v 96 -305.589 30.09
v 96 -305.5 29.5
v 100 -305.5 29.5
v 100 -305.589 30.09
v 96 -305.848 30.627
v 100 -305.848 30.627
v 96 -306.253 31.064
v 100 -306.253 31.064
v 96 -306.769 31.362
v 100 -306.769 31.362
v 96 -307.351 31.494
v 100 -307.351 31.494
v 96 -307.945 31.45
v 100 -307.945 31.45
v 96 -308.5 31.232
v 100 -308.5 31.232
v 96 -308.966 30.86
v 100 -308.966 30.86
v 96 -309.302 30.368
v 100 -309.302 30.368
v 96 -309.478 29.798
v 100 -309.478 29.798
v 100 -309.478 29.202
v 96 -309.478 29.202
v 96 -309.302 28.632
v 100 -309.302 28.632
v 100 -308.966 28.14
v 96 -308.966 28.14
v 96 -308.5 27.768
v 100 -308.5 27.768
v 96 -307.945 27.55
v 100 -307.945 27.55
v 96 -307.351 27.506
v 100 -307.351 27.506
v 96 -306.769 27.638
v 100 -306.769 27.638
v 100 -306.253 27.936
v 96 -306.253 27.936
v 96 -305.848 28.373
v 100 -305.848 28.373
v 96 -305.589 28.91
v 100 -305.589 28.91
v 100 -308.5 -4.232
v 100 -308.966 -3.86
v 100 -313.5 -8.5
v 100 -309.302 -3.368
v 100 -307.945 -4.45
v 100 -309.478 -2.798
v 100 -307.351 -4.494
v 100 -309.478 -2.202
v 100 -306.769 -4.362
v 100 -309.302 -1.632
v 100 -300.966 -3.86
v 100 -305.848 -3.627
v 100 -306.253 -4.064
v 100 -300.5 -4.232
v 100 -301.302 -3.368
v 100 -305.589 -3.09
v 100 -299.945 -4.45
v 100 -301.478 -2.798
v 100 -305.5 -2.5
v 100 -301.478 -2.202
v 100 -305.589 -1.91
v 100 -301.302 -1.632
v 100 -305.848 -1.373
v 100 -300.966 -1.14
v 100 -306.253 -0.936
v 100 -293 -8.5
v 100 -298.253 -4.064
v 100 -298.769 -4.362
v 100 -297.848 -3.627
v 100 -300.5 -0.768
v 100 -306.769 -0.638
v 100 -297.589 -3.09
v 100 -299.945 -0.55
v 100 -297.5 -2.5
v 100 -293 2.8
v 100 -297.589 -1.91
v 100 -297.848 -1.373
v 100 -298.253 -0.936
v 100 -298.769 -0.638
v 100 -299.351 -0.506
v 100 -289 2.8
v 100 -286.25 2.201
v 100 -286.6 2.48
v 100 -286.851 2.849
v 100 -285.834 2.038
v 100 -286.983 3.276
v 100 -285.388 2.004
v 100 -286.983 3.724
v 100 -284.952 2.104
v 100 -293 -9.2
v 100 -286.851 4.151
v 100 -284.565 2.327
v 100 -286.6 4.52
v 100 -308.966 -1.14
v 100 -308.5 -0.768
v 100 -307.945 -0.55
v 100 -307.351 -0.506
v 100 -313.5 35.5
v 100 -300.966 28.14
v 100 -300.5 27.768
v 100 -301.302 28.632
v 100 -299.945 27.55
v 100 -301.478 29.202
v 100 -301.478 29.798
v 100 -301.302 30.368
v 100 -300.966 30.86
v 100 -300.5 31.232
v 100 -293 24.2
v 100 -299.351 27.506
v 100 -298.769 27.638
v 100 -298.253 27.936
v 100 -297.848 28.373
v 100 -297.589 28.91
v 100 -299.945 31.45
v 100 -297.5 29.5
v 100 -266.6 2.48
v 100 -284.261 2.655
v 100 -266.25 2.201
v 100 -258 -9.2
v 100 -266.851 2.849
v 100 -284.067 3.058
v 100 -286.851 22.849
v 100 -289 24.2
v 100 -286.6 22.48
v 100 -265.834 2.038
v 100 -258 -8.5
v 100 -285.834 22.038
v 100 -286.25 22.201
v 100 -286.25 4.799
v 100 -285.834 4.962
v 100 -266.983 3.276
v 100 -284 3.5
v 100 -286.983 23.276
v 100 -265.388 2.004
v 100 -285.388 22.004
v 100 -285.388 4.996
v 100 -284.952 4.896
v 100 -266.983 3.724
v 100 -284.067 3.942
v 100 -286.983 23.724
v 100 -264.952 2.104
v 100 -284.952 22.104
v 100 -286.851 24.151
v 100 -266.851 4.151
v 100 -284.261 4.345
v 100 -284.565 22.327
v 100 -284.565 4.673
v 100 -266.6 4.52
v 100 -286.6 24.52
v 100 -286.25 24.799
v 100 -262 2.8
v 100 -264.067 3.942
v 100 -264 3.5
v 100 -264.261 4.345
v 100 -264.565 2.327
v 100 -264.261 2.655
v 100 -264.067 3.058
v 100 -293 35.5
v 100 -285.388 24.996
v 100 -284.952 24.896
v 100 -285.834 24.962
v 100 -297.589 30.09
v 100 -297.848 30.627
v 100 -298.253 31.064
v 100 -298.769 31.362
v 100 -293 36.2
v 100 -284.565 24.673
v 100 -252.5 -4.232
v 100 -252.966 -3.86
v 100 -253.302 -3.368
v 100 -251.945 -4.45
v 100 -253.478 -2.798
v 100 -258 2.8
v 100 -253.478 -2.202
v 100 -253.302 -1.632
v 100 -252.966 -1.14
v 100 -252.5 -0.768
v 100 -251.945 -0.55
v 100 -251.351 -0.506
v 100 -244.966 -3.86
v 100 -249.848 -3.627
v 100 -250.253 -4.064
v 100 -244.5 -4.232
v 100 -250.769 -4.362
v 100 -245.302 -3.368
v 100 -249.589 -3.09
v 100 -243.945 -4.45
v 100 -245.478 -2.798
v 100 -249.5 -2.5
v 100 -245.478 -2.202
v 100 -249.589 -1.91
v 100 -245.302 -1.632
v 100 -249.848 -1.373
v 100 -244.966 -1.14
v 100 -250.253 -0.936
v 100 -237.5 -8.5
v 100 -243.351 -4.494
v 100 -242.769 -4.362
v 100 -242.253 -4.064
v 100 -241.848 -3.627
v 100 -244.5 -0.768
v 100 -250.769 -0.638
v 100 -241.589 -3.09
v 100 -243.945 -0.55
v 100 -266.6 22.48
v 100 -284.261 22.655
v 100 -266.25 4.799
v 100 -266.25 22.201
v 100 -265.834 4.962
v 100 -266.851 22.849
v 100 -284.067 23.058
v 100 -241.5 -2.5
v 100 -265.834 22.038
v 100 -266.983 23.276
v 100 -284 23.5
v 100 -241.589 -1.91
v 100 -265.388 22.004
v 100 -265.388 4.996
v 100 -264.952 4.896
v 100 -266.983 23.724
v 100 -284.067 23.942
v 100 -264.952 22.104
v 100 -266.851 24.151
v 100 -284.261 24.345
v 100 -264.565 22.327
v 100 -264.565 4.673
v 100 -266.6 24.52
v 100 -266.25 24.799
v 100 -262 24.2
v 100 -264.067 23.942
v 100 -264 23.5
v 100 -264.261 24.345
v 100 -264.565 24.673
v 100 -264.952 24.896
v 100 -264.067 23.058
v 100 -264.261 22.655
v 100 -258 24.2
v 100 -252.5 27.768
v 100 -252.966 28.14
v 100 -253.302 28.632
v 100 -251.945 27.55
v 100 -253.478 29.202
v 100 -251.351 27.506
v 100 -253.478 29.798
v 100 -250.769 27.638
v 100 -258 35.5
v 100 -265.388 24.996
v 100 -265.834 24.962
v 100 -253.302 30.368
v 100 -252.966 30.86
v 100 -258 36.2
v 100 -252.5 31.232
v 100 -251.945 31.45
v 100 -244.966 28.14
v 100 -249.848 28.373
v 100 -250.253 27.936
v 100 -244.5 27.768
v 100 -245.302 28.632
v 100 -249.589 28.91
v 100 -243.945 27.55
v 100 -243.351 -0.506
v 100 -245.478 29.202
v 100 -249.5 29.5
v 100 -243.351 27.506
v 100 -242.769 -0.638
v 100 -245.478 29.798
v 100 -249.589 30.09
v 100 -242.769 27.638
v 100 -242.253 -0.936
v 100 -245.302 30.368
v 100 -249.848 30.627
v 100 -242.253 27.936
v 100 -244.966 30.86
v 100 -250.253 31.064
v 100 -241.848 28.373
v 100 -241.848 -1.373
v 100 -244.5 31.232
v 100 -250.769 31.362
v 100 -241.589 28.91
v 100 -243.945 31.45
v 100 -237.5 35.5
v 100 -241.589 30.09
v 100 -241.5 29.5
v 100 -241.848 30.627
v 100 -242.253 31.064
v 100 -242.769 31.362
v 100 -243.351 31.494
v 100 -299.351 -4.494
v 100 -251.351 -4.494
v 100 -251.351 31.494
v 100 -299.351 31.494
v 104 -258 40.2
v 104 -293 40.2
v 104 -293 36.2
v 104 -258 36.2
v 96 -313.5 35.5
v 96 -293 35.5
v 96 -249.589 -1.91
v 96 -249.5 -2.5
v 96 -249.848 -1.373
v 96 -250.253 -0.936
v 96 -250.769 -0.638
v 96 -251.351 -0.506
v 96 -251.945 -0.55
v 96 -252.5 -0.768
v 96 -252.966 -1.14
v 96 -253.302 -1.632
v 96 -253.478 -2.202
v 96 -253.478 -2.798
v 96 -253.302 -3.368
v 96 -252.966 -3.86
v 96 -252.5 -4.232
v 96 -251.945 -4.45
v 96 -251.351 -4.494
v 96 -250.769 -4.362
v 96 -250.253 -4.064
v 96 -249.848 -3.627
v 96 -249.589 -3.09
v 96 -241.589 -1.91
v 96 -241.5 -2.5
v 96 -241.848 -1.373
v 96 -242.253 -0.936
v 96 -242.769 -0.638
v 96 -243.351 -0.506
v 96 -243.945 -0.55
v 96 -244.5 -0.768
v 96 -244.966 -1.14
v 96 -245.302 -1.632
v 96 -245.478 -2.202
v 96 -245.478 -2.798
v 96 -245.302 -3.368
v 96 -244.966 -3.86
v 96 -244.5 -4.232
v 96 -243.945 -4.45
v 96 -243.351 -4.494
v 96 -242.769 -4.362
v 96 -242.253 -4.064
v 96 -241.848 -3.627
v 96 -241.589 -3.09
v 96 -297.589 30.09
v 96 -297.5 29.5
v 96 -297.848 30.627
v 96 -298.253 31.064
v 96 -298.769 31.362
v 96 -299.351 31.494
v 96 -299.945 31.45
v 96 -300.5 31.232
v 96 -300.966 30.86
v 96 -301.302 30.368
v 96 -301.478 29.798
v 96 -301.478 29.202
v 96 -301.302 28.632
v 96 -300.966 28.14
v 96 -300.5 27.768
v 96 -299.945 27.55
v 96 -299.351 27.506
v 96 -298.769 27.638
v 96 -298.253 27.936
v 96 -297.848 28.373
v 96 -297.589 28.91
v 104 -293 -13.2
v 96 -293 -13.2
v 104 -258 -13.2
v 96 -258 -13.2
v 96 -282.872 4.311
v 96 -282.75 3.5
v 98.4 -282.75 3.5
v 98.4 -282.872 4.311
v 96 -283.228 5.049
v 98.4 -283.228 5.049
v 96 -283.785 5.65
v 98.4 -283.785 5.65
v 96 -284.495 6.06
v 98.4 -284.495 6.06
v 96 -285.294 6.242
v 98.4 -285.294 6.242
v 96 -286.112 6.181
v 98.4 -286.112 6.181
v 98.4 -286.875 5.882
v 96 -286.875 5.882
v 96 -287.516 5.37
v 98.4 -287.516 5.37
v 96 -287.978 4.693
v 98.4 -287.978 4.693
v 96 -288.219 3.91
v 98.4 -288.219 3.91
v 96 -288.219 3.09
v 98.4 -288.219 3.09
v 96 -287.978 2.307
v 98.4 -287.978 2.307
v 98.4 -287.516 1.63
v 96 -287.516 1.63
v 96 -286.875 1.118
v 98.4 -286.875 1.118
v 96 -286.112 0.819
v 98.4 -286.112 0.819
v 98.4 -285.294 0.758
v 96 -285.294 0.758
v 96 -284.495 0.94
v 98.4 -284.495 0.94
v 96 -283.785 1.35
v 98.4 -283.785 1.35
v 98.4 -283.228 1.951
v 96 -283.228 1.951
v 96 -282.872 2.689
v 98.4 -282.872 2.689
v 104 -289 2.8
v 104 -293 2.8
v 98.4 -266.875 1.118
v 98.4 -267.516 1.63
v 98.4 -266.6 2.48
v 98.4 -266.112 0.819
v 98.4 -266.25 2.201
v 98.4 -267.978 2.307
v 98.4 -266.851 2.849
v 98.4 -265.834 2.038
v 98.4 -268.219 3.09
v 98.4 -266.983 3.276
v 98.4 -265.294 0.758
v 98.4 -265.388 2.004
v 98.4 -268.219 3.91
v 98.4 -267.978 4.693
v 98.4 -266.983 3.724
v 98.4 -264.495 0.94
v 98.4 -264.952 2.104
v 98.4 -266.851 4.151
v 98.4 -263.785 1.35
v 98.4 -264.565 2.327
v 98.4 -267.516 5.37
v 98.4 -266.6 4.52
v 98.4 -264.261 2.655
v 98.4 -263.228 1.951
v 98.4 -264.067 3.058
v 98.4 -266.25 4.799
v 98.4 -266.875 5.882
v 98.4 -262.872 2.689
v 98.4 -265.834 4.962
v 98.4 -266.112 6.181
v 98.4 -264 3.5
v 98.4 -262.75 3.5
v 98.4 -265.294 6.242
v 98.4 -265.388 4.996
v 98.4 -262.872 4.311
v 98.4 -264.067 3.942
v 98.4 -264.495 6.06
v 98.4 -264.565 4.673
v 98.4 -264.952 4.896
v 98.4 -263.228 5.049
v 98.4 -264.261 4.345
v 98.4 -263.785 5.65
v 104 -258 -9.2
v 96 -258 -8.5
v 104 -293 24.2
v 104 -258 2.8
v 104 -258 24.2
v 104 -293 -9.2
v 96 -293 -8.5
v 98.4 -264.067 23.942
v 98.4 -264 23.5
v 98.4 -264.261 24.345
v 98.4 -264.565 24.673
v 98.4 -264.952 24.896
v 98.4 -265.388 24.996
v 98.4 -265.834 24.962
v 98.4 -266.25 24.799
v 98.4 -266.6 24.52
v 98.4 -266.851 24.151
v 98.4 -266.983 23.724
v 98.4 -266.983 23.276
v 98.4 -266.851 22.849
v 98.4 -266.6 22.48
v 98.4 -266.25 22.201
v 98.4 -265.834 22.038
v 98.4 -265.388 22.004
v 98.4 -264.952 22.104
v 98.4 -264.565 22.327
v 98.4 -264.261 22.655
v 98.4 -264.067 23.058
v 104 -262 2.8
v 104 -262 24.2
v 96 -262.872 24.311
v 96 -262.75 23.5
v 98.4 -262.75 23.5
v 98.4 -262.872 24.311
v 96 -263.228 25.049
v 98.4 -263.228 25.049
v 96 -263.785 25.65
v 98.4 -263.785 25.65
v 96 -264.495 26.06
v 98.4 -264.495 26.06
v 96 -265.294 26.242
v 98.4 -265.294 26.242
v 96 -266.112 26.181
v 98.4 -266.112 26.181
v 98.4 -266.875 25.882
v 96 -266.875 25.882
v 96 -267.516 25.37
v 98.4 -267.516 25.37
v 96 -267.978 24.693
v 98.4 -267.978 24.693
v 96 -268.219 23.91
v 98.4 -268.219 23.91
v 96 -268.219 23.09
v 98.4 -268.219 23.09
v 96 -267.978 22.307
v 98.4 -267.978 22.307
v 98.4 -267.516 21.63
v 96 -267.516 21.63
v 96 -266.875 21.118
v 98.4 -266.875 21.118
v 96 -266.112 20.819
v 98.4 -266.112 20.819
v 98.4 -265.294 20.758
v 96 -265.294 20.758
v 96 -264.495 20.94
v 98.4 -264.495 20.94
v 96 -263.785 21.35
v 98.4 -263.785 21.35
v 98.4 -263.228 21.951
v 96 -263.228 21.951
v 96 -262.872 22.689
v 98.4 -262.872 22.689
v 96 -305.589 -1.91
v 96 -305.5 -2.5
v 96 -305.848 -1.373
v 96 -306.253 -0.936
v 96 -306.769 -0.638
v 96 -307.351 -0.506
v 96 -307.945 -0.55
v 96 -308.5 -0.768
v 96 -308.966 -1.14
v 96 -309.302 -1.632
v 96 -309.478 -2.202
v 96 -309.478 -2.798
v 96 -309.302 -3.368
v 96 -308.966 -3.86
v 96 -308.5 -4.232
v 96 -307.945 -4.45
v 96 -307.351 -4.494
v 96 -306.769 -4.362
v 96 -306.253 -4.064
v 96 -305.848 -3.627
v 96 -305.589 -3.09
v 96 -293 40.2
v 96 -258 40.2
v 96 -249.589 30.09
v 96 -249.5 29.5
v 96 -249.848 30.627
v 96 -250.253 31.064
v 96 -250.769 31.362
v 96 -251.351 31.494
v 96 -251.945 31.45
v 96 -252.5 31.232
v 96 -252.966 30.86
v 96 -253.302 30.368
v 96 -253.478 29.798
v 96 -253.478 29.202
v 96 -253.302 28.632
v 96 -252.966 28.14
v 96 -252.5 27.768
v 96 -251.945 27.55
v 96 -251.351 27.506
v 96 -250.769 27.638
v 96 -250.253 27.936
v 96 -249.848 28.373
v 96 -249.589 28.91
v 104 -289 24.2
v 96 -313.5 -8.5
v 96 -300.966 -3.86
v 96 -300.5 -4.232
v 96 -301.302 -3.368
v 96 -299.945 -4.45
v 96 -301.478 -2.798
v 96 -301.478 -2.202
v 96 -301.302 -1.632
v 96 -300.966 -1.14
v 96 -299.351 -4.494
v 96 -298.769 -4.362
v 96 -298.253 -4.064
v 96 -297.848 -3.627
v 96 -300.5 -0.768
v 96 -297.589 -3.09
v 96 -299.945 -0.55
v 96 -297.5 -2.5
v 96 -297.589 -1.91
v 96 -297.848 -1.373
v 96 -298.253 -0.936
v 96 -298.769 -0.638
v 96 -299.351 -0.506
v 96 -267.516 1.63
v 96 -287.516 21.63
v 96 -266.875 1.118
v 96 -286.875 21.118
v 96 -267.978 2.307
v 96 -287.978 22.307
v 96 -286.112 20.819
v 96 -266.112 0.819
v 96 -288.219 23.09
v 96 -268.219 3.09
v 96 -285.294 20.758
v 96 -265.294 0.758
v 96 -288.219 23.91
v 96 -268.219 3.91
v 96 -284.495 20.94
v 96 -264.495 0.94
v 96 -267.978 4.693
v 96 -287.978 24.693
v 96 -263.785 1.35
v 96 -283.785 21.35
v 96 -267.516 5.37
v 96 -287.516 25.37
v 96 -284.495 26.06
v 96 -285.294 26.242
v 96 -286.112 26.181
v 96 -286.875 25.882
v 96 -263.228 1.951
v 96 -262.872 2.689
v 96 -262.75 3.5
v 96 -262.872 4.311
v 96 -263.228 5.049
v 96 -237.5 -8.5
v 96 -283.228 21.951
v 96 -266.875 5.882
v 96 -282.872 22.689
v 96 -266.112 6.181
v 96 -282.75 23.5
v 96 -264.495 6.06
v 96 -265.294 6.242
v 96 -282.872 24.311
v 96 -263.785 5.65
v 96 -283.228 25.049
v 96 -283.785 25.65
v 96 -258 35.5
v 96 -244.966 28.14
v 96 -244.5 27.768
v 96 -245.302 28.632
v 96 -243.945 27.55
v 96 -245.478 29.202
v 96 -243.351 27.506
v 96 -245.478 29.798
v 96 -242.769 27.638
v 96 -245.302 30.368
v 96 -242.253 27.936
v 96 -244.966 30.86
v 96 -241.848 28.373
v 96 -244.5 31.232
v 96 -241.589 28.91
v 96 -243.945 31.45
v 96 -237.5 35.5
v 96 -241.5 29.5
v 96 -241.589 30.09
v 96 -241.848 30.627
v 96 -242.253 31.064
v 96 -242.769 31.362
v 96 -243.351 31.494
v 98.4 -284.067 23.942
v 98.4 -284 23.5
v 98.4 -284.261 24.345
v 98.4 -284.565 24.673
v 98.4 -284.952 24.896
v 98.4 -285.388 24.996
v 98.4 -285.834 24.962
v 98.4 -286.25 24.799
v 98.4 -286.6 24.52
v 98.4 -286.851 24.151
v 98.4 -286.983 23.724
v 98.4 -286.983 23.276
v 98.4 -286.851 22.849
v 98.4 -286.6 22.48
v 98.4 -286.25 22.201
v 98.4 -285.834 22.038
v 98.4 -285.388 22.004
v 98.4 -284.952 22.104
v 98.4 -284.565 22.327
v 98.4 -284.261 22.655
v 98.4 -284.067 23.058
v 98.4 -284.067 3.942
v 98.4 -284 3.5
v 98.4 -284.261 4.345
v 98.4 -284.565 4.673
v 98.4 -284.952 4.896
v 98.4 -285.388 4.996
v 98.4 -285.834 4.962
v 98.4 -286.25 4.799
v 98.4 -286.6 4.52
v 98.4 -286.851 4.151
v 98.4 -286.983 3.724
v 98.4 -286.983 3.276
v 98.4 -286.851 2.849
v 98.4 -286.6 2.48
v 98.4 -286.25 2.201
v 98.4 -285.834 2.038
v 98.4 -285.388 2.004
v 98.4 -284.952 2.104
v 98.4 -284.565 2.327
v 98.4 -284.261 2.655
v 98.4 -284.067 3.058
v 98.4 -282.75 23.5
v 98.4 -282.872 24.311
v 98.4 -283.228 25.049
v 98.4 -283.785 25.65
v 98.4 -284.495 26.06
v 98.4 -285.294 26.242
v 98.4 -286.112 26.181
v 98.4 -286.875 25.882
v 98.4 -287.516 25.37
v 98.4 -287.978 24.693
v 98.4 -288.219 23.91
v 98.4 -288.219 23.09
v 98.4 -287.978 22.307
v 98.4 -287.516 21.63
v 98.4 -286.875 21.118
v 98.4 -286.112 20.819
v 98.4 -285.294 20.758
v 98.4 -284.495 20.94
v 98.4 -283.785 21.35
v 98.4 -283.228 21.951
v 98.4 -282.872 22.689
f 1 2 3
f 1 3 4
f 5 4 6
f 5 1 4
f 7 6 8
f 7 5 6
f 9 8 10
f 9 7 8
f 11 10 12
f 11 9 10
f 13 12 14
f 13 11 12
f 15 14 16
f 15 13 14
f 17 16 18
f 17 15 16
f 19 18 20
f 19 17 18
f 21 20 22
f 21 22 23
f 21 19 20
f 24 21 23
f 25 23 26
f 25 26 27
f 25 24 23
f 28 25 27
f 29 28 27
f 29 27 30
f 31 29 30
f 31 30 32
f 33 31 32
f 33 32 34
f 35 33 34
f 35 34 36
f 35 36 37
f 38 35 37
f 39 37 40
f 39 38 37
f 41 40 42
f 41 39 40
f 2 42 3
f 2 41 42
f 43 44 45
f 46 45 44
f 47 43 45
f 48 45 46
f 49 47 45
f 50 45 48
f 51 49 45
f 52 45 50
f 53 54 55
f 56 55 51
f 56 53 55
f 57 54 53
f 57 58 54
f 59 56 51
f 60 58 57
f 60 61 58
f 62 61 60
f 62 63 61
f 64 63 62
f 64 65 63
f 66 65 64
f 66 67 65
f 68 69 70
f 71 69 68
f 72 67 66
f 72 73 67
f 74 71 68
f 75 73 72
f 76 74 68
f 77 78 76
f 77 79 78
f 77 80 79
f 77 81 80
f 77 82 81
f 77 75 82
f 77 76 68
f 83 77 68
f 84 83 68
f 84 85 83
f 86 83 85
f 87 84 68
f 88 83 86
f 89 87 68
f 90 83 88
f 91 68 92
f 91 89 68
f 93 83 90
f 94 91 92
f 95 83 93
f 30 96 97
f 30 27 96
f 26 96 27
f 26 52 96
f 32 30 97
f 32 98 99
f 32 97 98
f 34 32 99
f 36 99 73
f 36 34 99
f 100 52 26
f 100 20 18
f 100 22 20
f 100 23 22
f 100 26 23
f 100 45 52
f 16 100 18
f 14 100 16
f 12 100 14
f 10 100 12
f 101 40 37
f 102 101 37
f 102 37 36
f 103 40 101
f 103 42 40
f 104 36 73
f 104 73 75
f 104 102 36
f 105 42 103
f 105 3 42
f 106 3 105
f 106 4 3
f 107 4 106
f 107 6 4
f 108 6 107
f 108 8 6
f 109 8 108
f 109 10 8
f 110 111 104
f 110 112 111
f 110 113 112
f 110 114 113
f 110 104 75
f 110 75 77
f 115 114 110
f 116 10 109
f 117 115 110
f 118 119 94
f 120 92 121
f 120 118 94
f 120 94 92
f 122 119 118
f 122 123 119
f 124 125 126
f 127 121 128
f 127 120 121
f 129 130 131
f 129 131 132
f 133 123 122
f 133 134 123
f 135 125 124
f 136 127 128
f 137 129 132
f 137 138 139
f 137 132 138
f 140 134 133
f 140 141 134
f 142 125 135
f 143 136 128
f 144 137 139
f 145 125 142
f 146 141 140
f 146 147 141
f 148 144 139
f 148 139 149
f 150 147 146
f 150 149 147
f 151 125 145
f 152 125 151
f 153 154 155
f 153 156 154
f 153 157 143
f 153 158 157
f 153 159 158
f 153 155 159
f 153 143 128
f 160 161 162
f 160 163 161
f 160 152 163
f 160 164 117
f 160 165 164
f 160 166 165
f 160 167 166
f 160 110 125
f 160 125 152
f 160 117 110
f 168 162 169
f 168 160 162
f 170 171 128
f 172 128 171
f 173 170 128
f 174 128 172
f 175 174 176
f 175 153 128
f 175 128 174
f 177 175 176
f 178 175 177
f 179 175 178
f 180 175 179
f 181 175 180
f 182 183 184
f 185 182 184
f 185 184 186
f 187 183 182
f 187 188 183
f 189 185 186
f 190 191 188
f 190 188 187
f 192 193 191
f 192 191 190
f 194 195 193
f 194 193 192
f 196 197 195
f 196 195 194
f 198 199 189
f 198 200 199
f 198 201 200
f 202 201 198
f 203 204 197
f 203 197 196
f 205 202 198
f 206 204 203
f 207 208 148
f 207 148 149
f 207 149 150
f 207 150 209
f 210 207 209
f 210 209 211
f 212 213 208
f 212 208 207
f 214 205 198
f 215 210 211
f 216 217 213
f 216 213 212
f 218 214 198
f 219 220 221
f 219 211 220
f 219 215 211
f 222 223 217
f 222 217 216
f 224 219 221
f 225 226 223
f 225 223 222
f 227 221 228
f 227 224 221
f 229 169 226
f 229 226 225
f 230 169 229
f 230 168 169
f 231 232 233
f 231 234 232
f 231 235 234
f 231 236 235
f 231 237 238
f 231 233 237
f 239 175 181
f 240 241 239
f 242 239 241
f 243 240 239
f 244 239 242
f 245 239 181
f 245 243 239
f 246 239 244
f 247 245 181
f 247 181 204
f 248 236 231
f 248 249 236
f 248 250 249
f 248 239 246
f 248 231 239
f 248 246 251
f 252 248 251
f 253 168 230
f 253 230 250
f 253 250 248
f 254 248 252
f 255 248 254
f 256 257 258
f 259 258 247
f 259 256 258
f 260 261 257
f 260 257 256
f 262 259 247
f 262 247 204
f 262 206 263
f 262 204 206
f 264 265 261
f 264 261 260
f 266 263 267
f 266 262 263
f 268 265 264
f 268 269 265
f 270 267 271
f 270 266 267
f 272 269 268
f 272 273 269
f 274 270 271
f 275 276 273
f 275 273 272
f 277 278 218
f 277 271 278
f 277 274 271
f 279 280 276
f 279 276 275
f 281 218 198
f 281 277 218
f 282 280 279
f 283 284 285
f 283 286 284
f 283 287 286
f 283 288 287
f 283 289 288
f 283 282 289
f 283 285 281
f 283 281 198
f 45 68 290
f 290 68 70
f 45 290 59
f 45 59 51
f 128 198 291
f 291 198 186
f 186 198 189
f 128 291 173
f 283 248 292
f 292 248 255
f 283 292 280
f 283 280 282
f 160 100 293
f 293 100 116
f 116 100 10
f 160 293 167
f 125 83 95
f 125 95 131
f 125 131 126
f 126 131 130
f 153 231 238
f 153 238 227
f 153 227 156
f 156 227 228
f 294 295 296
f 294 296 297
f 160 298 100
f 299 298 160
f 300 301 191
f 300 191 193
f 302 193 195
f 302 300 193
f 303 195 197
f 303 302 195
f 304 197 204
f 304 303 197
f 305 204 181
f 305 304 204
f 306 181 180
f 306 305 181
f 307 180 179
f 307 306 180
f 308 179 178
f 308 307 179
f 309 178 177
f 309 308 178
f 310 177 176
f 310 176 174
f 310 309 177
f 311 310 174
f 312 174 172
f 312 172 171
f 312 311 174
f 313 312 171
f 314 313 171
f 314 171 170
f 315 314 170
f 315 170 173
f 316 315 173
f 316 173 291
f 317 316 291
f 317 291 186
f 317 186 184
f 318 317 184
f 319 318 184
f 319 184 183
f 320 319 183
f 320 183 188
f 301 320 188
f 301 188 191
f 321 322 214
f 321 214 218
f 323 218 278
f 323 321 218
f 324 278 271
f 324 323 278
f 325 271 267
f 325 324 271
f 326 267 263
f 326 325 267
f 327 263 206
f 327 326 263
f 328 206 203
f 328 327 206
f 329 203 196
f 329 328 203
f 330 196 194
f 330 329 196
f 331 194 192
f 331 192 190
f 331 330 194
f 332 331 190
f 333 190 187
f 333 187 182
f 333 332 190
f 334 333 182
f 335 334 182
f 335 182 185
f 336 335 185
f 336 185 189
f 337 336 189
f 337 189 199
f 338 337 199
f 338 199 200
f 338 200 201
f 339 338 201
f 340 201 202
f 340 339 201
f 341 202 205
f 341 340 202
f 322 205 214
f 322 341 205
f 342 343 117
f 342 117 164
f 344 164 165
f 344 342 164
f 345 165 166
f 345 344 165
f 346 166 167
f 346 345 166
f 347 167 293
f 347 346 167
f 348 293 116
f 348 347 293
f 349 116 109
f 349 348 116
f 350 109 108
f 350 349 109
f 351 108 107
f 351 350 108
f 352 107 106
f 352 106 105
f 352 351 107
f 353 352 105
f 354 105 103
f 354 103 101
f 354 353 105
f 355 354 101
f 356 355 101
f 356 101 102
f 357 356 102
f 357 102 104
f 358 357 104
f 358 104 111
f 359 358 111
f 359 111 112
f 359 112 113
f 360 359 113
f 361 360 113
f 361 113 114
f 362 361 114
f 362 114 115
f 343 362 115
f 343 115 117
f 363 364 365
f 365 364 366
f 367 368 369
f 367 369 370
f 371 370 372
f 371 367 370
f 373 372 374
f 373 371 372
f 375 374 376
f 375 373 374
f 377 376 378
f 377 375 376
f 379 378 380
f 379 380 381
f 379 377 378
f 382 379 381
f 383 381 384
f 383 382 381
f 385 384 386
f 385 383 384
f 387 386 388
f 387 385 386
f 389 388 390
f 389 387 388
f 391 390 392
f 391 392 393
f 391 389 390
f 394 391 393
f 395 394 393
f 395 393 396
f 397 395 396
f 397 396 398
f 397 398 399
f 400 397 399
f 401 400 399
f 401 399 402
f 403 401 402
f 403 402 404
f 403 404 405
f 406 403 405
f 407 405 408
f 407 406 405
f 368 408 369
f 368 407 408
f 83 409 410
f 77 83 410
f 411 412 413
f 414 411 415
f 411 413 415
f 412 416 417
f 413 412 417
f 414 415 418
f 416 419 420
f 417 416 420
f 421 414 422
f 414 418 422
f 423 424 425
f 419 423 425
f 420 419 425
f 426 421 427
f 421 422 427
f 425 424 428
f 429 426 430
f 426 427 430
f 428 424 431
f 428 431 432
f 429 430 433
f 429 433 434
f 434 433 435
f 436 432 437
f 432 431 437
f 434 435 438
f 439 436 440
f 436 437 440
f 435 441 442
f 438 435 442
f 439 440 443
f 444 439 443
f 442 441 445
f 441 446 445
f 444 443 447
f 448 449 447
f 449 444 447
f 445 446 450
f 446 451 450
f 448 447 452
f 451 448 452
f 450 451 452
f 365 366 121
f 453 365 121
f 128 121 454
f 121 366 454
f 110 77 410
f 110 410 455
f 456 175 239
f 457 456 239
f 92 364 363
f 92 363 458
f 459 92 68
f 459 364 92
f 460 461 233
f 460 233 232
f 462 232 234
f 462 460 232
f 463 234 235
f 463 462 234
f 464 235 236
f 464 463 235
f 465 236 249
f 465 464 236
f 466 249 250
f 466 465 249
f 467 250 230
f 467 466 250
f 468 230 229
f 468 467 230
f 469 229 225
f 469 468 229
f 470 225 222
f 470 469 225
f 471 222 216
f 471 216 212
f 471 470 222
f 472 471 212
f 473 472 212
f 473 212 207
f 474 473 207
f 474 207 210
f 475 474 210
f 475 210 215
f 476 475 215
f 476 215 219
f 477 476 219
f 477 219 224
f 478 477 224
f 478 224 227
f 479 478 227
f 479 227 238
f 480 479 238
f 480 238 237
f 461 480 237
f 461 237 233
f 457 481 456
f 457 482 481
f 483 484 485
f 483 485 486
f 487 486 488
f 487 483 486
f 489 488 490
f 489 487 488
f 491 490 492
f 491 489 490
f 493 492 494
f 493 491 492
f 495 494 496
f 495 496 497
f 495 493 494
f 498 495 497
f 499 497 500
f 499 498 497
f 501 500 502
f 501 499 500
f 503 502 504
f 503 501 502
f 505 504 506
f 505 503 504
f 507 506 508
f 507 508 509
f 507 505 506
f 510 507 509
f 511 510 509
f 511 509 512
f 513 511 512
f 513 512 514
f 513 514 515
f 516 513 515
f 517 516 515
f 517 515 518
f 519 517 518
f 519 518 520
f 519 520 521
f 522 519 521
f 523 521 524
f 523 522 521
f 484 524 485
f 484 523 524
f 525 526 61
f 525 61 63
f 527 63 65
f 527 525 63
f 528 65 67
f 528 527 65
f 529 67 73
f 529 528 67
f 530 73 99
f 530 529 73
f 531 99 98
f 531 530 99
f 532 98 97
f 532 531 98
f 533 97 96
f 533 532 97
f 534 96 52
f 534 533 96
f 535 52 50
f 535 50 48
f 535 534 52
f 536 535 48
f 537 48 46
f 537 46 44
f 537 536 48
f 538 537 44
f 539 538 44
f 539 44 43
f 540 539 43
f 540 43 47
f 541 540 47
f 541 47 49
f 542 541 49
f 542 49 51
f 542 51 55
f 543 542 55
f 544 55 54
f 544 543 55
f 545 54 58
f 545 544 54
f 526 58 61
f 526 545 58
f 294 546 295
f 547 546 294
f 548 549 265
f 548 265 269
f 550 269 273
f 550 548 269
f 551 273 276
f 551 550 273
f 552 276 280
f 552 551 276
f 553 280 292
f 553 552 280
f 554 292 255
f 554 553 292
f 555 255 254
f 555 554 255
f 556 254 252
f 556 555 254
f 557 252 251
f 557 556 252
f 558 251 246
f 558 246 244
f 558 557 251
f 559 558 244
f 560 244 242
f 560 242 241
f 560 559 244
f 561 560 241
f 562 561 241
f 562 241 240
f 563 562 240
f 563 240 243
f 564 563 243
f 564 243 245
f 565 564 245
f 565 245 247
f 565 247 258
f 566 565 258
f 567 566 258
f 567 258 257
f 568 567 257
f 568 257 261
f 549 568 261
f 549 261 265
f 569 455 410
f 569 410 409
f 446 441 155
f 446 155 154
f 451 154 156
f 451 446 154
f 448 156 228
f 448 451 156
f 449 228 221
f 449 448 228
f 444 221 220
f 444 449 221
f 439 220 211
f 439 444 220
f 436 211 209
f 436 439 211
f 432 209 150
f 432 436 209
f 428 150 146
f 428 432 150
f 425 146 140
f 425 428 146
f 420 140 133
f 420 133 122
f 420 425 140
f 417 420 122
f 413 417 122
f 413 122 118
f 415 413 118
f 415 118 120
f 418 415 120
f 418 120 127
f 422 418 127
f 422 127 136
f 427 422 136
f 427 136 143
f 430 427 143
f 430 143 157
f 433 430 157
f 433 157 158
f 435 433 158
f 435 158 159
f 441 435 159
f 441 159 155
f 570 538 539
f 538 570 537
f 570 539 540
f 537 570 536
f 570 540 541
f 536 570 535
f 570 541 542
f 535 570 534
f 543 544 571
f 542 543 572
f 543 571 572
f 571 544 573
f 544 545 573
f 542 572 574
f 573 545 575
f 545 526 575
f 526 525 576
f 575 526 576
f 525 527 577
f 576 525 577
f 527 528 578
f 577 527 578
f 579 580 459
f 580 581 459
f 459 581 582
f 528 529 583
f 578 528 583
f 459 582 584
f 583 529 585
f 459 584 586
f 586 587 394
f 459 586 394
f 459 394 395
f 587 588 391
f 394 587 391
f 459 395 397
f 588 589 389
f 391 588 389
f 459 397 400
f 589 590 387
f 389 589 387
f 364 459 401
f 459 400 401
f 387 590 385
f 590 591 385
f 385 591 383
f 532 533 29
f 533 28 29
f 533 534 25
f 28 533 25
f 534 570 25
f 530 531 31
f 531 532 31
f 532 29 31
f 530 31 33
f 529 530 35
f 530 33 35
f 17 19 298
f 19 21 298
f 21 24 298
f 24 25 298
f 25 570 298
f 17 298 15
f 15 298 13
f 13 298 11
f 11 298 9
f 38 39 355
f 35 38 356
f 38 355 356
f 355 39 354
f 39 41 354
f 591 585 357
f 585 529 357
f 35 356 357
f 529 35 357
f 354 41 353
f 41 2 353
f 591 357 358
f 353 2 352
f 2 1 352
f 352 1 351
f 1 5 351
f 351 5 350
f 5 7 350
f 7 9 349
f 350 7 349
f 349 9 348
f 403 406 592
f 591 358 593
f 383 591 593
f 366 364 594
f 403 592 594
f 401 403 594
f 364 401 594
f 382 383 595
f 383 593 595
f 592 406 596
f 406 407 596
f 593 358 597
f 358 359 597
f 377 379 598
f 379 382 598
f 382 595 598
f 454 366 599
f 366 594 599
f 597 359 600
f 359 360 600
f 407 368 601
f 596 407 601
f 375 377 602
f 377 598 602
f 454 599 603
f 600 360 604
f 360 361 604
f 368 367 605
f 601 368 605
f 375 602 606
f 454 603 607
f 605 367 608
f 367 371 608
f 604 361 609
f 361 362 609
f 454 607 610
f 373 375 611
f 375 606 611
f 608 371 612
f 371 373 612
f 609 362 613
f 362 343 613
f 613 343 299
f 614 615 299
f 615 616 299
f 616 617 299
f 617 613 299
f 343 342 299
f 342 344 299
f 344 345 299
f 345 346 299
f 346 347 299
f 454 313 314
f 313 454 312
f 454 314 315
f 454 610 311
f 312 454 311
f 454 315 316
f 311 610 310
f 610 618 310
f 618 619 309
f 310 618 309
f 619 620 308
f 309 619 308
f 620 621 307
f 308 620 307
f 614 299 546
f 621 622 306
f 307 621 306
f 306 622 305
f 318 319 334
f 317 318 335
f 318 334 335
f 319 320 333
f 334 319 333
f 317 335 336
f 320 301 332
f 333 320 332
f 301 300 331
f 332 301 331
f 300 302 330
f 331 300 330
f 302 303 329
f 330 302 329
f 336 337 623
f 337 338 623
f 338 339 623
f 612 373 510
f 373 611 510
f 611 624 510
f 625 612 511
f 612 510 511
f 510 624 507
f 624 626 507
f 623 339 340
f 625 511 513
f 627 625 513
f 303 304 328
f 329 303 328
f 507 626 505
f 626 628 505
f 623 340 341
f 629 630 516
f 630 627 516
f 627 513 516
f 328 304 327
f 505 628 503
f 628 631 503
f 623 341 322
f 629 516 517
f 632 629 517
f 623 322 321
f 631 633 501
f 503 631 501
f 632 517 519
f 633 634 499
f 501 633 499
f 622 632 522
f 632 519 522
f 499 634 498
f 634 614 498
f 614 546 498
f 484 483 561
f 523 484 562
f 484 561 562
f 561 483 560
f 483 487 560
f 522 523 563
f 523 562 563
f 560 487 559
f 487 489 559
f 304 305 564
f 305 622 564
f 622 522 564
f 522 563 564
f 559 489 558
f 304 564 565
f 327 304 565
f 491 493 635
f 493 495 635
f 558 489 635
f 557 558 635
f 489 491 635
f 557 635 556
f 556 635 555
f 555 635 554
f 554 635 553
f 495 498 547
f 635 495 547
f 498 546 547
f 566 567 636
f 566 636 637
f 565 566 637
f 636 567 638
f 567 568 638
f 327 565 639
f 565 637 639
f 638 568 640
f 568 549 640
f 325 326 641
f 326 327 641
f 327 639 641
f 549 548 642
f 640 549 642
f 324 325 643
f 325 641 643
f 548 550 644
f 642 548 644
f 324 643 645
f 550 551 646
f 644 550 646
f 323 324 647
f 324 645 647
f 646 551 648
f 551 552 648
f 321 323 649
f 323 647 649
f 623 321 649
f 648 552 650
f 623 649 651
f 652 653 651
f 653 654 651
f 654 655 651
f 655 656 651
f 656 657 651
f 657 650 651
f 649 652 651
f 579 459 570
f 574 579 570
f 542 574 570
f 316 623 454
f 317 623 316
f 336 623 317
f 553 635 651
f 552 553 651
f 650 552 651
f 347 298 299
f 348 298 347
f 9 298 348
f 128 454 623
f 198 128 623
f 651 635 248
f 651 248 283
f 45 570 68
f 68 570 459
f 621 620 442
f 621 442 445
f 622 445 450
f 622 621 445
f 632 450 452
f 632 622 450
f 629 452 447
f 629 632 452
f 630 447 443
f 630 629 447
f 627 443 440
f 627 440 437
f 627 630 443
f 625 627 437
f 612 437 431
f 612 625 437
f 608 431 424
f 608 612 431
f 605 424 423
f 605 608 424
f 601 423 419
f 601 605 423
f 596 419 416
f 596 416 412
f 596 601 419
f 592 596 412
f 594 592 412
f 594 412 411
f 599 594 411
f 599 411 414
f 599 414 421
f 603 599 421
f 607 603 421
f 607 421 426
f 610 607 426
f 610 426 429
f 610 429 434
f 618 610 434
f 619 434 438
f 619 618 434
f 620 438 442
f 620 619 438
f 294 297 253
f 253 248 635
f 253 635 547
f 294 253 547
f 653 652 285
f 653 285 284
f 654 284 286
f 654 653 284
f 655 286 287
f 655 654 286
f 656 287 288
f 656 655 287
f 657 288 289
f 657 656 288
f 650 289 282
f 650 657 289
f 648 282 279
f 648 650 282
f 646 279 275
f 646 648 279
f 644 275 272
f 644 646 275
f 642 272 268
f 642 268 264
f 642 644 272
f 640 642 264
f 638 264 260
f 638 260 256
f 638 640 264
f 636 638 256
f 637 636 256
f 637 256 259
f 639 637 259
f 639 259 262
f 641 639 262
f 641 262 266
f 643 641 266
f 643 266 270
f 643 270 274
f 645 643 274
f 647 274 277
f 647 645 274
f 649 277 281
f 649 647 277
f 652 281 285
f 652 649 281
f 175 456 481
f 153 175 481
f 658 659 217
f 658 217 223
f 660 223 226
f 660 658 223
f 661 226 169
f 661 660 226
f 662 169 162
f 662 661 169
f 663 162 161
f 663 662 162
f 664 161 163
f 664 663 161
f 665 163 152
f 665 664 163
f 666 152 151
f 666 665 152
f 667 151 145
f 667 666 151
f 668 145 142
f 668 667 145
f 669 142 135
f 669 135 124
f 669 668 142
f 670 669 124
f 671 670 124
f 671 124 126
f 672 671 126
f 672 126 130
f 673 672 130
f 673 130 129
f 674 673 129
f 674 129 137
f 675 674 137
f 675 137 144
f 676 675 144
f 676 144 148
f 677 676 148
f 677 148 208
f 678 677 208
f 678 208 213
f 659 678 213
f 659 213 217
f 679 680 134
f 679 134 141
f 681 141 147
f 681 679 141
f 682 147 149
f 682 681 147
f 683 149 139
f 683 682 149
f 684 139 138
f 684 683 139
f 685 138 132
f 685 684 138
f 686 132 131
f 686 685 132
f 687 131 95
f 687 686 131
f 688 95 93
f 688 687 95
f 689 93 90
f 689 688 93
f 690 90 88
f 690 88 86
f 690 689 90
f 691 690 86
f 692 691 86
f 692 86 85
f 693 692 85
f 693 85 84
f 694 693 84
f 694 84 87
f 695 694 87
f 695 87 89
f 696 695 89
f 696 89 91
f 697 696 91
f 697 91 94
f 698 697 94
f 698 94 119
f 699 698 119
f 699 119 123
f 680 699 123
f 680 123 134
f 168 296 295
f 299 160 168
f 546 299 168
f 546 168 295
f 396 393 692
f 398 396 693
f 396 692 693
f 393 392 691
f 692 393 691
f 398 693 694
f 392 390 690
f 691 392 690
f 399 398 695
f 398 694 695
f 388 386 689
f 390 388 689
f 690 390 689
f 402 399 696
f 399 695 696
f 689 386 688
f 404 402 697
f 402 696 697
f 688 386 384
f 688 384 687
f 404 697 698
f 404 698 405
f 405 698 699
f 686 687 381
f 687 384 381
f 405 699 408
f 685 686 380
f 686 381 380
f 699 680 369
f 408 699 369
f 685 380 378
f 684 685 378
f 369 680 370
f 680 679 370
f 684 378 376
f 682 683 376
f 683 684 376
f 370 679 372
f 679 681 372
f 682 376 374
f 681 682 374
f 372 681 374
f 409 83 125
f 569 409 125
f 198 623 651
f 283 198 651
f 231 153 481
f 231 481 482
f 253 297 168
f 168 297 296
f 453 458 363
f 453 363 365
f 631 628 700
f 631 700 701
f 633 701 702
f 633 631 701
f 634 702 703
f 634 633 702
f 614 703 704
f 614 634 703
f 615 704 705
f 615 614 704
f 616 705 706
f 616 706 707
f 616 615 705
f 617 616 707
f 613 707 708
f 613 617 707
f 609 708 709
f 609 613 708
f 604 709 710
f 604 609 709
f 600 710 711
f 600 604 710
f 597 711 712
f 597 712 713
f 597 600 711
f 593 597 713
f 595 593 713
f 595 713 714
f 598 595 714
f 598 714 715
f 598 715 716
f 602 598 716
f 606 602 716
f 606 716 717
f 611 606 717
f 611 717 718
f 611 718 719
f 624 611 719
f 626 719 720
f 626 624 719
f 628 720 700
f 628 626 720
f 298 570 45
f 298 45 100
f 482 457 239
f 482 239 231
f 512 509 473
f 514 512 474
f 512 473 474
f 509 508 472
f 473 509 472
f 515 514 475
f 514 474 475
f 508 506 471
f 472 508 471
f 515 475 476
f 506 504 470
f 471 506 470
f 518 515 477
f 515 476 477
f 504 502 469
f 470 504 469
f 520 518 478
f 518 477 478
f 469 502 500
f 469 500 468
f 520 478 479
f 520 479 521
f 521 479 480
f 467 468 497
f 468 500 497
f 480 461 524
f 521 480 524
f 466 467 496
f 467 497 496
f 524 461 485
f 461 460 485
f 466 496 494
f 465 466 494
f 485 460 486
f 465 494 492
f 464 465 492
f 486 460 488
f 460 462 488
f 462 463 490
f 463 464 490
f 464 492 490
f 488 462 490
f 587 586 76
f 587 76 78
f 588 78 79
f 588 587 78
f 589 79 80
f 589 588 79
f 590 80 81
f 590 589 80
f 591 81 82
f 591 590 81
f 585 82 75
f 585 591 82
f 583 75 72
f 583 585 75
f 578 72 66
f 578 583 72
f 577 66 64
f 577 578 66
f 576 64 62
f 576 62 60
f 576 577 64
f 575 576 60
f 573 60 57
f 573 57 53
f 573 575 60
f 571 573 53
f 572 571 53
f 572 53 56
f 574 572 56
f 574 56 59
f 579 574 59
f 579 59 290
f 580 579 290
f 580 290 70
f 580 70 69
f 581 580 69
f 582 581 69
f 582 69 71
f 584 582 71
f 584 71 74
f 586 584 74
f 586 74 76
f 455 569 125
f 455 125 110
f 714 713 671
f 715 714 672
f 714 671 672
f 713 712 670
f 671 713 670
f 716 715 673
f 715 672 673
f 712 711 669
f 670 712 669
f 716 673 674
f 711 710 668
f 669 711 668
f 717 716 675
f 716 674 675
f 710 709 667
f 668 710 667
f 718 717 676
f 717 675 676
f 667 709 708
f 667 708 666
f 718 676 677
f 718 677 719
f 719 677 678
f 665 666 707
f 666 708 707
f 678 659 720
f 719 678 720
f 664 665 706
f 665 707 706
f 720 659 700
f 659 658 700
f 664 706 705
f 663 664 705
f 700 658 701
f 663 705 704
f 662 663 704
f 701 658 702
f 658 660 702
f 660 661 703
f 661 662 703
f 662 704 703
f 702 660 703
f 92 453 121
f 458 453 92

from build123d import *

# Parameters (mm, degrees)
SKETCH053_W     = 4
SKETCH053_H     = 27
PAD030_DEPTH    = 45.4
SKETCH054_R     = 1.5
POCKET022_DEPTH = 5
SKETCH055_R     = 2.75
POCKET023_DEPTH = 2.4
SKETCH056_W     = 35
SKETCH056_H     = 53.4
SKETCH056_W_2   = 27
SKETCH056_H_2   = 45.4
PAD031_DEPTH    = 8
SKETCH057_W     = 76
SKETCH057_H     = 44
SKETCH057_R     = 2
SKETCH057_W_2   = 30
SKETCH057_H_2   = 30
PAD032_DEPTH    = 4
SKETCH058_W     = 50
SKETCH058_H     = 12
POCKET024_DEPTH = 4


with BuildPart() as left001:
    # Sketch053 → Pad030 (new body)
    with BuildSketch(Plane.XY):
        Rectangle(SKETCH053_W, SKETCH053_H)
    extrude(amount=PAD030_DEPTH)

    # Sketch054 (on Face2 of Pad030) → Pocket022 (cut)
    with BuildSketch(Plane.YZ.offset(2)):
        with Locations((-10, 32.7)):
            Circle(SKETCH054_R)
        with Locations((10, 32.7)):
            Circle(SKETCH054_R)
        with Locations((10, 12.7)):
            Circle(SKETCH054_R)
        with Locations((-10, 12.7)):
            Circle(SKETCH054_R)
    extrude(amount=-POCKET022_DEPTH, mode=Mode.SUBTRACT)

    # Sketch055 (on Face2 of Pad030) → Pocket023 (cut)
    with BuildSketch(Plane.YZ.offset(2)):
        with Locations((-10, 32.7)):
            Circle(SKETCH055_R)
        with Locations((10, 32.7)):
            Circle(SKETCH055_R)
        with Locations((10, 12.7)):
            Circle(SKETCH055_R)
        with Locations((-10, 12.7)):
            Circle(SKETCH055_R)
    extrude(amount=-POCKET023_DEPTH, mode=Mode.SUBTRACT)

    # Sketch056 (on Face3 of Pocket023) → Pad031 (join)
    with BuildSketch(Plane.YZ.offset(2)):
        with Locations((0, 22.7)):
            Rectangle(SKETCH056_W, SKETCH056_H)
        with Locations((0, 22.7)):
            Rectangle(SKETCH056_W_2, SKETCH056_H_2, mode=Mode.SUBTRACT)
    extrude(amount=-PAD031_DEPTH)

    # Sketch057 (on Face23 of Pad031) → Pad032 (join)
    with BuildSketch(Plane.YZ.offset(2)):
        with Locations((0, 22.7)):
            Rectangle(SKETCH057_W, SKETCH057_H)
        with Locations((-32, 38.7)):
            Circle(SKETCH057_R, mode=Mode.SUBTRACT)
        with Locations((32, 38.7)):
            Circle(SKETCH057_R, mode=Mode.SUBTRACT)
        with Locations((32, 6.7)):
            Circle(SKETCH057_R, mode=Mode.SUBTRACT)
        with Locations((-32, 6.7)):
            Circle(SKETCH057_R, mode=Mode.SUBTRACT)
        with Locations((-24, 38.7)):
            Circle(SKETCH057_R, mode=Mode.SUBTRACT)
        with Locations((24, 38.7)):
            Circle(SKETCH057_R, mode=Mode.SUBTRACT)
        with Locations((24, 6.7)):
            Circle(SKETCH057_R, mode=Mode.SUBTRACT)
        with Locations((-24, 6.7)):
            Circle(SKETCH057_R, mode=Mode.SUBTRACT)
        with Locations((0, 22.7)):
            Rectangle(SKETCH057_W_2, SKETCH057_H_2, mode=Mode.SUBTRACT)
    extrude(amount=-PAD032_DEPTH)

    # Sketch058 (on Face4 of Pad032) → Pocket024 (cut)
    with BuildSketch(Plane(origin=(-6, 0, 0), x_dir=(0, -1, 0), z_dir=(-1, 0, 0))):
        with Locations((0, 39.4)):
            Rectangle(SKETCH058_W, SKETCH058_H)
        with Locations((0, 6)):
            Rectangle(SKETCH058_W, SKETCH058_H)
    extrude(amount=-POCKET024_DEPTH, mode=Mode.SUBTRACT)


with BuildPart() as left001_1:
    # Body017 placement: moved
    add(left001.part.moved(Location((-98, -275.5, -9.2))))


with BuildPart() as right001:
    # Part__Mirroring006: instance of Left001
    add(left001_1.part.mirror(Plane(origin=(0, 0, 0), x_dir=(0, -1, 0), z_dir=(1, 0, 0))))


solid = right001.part
